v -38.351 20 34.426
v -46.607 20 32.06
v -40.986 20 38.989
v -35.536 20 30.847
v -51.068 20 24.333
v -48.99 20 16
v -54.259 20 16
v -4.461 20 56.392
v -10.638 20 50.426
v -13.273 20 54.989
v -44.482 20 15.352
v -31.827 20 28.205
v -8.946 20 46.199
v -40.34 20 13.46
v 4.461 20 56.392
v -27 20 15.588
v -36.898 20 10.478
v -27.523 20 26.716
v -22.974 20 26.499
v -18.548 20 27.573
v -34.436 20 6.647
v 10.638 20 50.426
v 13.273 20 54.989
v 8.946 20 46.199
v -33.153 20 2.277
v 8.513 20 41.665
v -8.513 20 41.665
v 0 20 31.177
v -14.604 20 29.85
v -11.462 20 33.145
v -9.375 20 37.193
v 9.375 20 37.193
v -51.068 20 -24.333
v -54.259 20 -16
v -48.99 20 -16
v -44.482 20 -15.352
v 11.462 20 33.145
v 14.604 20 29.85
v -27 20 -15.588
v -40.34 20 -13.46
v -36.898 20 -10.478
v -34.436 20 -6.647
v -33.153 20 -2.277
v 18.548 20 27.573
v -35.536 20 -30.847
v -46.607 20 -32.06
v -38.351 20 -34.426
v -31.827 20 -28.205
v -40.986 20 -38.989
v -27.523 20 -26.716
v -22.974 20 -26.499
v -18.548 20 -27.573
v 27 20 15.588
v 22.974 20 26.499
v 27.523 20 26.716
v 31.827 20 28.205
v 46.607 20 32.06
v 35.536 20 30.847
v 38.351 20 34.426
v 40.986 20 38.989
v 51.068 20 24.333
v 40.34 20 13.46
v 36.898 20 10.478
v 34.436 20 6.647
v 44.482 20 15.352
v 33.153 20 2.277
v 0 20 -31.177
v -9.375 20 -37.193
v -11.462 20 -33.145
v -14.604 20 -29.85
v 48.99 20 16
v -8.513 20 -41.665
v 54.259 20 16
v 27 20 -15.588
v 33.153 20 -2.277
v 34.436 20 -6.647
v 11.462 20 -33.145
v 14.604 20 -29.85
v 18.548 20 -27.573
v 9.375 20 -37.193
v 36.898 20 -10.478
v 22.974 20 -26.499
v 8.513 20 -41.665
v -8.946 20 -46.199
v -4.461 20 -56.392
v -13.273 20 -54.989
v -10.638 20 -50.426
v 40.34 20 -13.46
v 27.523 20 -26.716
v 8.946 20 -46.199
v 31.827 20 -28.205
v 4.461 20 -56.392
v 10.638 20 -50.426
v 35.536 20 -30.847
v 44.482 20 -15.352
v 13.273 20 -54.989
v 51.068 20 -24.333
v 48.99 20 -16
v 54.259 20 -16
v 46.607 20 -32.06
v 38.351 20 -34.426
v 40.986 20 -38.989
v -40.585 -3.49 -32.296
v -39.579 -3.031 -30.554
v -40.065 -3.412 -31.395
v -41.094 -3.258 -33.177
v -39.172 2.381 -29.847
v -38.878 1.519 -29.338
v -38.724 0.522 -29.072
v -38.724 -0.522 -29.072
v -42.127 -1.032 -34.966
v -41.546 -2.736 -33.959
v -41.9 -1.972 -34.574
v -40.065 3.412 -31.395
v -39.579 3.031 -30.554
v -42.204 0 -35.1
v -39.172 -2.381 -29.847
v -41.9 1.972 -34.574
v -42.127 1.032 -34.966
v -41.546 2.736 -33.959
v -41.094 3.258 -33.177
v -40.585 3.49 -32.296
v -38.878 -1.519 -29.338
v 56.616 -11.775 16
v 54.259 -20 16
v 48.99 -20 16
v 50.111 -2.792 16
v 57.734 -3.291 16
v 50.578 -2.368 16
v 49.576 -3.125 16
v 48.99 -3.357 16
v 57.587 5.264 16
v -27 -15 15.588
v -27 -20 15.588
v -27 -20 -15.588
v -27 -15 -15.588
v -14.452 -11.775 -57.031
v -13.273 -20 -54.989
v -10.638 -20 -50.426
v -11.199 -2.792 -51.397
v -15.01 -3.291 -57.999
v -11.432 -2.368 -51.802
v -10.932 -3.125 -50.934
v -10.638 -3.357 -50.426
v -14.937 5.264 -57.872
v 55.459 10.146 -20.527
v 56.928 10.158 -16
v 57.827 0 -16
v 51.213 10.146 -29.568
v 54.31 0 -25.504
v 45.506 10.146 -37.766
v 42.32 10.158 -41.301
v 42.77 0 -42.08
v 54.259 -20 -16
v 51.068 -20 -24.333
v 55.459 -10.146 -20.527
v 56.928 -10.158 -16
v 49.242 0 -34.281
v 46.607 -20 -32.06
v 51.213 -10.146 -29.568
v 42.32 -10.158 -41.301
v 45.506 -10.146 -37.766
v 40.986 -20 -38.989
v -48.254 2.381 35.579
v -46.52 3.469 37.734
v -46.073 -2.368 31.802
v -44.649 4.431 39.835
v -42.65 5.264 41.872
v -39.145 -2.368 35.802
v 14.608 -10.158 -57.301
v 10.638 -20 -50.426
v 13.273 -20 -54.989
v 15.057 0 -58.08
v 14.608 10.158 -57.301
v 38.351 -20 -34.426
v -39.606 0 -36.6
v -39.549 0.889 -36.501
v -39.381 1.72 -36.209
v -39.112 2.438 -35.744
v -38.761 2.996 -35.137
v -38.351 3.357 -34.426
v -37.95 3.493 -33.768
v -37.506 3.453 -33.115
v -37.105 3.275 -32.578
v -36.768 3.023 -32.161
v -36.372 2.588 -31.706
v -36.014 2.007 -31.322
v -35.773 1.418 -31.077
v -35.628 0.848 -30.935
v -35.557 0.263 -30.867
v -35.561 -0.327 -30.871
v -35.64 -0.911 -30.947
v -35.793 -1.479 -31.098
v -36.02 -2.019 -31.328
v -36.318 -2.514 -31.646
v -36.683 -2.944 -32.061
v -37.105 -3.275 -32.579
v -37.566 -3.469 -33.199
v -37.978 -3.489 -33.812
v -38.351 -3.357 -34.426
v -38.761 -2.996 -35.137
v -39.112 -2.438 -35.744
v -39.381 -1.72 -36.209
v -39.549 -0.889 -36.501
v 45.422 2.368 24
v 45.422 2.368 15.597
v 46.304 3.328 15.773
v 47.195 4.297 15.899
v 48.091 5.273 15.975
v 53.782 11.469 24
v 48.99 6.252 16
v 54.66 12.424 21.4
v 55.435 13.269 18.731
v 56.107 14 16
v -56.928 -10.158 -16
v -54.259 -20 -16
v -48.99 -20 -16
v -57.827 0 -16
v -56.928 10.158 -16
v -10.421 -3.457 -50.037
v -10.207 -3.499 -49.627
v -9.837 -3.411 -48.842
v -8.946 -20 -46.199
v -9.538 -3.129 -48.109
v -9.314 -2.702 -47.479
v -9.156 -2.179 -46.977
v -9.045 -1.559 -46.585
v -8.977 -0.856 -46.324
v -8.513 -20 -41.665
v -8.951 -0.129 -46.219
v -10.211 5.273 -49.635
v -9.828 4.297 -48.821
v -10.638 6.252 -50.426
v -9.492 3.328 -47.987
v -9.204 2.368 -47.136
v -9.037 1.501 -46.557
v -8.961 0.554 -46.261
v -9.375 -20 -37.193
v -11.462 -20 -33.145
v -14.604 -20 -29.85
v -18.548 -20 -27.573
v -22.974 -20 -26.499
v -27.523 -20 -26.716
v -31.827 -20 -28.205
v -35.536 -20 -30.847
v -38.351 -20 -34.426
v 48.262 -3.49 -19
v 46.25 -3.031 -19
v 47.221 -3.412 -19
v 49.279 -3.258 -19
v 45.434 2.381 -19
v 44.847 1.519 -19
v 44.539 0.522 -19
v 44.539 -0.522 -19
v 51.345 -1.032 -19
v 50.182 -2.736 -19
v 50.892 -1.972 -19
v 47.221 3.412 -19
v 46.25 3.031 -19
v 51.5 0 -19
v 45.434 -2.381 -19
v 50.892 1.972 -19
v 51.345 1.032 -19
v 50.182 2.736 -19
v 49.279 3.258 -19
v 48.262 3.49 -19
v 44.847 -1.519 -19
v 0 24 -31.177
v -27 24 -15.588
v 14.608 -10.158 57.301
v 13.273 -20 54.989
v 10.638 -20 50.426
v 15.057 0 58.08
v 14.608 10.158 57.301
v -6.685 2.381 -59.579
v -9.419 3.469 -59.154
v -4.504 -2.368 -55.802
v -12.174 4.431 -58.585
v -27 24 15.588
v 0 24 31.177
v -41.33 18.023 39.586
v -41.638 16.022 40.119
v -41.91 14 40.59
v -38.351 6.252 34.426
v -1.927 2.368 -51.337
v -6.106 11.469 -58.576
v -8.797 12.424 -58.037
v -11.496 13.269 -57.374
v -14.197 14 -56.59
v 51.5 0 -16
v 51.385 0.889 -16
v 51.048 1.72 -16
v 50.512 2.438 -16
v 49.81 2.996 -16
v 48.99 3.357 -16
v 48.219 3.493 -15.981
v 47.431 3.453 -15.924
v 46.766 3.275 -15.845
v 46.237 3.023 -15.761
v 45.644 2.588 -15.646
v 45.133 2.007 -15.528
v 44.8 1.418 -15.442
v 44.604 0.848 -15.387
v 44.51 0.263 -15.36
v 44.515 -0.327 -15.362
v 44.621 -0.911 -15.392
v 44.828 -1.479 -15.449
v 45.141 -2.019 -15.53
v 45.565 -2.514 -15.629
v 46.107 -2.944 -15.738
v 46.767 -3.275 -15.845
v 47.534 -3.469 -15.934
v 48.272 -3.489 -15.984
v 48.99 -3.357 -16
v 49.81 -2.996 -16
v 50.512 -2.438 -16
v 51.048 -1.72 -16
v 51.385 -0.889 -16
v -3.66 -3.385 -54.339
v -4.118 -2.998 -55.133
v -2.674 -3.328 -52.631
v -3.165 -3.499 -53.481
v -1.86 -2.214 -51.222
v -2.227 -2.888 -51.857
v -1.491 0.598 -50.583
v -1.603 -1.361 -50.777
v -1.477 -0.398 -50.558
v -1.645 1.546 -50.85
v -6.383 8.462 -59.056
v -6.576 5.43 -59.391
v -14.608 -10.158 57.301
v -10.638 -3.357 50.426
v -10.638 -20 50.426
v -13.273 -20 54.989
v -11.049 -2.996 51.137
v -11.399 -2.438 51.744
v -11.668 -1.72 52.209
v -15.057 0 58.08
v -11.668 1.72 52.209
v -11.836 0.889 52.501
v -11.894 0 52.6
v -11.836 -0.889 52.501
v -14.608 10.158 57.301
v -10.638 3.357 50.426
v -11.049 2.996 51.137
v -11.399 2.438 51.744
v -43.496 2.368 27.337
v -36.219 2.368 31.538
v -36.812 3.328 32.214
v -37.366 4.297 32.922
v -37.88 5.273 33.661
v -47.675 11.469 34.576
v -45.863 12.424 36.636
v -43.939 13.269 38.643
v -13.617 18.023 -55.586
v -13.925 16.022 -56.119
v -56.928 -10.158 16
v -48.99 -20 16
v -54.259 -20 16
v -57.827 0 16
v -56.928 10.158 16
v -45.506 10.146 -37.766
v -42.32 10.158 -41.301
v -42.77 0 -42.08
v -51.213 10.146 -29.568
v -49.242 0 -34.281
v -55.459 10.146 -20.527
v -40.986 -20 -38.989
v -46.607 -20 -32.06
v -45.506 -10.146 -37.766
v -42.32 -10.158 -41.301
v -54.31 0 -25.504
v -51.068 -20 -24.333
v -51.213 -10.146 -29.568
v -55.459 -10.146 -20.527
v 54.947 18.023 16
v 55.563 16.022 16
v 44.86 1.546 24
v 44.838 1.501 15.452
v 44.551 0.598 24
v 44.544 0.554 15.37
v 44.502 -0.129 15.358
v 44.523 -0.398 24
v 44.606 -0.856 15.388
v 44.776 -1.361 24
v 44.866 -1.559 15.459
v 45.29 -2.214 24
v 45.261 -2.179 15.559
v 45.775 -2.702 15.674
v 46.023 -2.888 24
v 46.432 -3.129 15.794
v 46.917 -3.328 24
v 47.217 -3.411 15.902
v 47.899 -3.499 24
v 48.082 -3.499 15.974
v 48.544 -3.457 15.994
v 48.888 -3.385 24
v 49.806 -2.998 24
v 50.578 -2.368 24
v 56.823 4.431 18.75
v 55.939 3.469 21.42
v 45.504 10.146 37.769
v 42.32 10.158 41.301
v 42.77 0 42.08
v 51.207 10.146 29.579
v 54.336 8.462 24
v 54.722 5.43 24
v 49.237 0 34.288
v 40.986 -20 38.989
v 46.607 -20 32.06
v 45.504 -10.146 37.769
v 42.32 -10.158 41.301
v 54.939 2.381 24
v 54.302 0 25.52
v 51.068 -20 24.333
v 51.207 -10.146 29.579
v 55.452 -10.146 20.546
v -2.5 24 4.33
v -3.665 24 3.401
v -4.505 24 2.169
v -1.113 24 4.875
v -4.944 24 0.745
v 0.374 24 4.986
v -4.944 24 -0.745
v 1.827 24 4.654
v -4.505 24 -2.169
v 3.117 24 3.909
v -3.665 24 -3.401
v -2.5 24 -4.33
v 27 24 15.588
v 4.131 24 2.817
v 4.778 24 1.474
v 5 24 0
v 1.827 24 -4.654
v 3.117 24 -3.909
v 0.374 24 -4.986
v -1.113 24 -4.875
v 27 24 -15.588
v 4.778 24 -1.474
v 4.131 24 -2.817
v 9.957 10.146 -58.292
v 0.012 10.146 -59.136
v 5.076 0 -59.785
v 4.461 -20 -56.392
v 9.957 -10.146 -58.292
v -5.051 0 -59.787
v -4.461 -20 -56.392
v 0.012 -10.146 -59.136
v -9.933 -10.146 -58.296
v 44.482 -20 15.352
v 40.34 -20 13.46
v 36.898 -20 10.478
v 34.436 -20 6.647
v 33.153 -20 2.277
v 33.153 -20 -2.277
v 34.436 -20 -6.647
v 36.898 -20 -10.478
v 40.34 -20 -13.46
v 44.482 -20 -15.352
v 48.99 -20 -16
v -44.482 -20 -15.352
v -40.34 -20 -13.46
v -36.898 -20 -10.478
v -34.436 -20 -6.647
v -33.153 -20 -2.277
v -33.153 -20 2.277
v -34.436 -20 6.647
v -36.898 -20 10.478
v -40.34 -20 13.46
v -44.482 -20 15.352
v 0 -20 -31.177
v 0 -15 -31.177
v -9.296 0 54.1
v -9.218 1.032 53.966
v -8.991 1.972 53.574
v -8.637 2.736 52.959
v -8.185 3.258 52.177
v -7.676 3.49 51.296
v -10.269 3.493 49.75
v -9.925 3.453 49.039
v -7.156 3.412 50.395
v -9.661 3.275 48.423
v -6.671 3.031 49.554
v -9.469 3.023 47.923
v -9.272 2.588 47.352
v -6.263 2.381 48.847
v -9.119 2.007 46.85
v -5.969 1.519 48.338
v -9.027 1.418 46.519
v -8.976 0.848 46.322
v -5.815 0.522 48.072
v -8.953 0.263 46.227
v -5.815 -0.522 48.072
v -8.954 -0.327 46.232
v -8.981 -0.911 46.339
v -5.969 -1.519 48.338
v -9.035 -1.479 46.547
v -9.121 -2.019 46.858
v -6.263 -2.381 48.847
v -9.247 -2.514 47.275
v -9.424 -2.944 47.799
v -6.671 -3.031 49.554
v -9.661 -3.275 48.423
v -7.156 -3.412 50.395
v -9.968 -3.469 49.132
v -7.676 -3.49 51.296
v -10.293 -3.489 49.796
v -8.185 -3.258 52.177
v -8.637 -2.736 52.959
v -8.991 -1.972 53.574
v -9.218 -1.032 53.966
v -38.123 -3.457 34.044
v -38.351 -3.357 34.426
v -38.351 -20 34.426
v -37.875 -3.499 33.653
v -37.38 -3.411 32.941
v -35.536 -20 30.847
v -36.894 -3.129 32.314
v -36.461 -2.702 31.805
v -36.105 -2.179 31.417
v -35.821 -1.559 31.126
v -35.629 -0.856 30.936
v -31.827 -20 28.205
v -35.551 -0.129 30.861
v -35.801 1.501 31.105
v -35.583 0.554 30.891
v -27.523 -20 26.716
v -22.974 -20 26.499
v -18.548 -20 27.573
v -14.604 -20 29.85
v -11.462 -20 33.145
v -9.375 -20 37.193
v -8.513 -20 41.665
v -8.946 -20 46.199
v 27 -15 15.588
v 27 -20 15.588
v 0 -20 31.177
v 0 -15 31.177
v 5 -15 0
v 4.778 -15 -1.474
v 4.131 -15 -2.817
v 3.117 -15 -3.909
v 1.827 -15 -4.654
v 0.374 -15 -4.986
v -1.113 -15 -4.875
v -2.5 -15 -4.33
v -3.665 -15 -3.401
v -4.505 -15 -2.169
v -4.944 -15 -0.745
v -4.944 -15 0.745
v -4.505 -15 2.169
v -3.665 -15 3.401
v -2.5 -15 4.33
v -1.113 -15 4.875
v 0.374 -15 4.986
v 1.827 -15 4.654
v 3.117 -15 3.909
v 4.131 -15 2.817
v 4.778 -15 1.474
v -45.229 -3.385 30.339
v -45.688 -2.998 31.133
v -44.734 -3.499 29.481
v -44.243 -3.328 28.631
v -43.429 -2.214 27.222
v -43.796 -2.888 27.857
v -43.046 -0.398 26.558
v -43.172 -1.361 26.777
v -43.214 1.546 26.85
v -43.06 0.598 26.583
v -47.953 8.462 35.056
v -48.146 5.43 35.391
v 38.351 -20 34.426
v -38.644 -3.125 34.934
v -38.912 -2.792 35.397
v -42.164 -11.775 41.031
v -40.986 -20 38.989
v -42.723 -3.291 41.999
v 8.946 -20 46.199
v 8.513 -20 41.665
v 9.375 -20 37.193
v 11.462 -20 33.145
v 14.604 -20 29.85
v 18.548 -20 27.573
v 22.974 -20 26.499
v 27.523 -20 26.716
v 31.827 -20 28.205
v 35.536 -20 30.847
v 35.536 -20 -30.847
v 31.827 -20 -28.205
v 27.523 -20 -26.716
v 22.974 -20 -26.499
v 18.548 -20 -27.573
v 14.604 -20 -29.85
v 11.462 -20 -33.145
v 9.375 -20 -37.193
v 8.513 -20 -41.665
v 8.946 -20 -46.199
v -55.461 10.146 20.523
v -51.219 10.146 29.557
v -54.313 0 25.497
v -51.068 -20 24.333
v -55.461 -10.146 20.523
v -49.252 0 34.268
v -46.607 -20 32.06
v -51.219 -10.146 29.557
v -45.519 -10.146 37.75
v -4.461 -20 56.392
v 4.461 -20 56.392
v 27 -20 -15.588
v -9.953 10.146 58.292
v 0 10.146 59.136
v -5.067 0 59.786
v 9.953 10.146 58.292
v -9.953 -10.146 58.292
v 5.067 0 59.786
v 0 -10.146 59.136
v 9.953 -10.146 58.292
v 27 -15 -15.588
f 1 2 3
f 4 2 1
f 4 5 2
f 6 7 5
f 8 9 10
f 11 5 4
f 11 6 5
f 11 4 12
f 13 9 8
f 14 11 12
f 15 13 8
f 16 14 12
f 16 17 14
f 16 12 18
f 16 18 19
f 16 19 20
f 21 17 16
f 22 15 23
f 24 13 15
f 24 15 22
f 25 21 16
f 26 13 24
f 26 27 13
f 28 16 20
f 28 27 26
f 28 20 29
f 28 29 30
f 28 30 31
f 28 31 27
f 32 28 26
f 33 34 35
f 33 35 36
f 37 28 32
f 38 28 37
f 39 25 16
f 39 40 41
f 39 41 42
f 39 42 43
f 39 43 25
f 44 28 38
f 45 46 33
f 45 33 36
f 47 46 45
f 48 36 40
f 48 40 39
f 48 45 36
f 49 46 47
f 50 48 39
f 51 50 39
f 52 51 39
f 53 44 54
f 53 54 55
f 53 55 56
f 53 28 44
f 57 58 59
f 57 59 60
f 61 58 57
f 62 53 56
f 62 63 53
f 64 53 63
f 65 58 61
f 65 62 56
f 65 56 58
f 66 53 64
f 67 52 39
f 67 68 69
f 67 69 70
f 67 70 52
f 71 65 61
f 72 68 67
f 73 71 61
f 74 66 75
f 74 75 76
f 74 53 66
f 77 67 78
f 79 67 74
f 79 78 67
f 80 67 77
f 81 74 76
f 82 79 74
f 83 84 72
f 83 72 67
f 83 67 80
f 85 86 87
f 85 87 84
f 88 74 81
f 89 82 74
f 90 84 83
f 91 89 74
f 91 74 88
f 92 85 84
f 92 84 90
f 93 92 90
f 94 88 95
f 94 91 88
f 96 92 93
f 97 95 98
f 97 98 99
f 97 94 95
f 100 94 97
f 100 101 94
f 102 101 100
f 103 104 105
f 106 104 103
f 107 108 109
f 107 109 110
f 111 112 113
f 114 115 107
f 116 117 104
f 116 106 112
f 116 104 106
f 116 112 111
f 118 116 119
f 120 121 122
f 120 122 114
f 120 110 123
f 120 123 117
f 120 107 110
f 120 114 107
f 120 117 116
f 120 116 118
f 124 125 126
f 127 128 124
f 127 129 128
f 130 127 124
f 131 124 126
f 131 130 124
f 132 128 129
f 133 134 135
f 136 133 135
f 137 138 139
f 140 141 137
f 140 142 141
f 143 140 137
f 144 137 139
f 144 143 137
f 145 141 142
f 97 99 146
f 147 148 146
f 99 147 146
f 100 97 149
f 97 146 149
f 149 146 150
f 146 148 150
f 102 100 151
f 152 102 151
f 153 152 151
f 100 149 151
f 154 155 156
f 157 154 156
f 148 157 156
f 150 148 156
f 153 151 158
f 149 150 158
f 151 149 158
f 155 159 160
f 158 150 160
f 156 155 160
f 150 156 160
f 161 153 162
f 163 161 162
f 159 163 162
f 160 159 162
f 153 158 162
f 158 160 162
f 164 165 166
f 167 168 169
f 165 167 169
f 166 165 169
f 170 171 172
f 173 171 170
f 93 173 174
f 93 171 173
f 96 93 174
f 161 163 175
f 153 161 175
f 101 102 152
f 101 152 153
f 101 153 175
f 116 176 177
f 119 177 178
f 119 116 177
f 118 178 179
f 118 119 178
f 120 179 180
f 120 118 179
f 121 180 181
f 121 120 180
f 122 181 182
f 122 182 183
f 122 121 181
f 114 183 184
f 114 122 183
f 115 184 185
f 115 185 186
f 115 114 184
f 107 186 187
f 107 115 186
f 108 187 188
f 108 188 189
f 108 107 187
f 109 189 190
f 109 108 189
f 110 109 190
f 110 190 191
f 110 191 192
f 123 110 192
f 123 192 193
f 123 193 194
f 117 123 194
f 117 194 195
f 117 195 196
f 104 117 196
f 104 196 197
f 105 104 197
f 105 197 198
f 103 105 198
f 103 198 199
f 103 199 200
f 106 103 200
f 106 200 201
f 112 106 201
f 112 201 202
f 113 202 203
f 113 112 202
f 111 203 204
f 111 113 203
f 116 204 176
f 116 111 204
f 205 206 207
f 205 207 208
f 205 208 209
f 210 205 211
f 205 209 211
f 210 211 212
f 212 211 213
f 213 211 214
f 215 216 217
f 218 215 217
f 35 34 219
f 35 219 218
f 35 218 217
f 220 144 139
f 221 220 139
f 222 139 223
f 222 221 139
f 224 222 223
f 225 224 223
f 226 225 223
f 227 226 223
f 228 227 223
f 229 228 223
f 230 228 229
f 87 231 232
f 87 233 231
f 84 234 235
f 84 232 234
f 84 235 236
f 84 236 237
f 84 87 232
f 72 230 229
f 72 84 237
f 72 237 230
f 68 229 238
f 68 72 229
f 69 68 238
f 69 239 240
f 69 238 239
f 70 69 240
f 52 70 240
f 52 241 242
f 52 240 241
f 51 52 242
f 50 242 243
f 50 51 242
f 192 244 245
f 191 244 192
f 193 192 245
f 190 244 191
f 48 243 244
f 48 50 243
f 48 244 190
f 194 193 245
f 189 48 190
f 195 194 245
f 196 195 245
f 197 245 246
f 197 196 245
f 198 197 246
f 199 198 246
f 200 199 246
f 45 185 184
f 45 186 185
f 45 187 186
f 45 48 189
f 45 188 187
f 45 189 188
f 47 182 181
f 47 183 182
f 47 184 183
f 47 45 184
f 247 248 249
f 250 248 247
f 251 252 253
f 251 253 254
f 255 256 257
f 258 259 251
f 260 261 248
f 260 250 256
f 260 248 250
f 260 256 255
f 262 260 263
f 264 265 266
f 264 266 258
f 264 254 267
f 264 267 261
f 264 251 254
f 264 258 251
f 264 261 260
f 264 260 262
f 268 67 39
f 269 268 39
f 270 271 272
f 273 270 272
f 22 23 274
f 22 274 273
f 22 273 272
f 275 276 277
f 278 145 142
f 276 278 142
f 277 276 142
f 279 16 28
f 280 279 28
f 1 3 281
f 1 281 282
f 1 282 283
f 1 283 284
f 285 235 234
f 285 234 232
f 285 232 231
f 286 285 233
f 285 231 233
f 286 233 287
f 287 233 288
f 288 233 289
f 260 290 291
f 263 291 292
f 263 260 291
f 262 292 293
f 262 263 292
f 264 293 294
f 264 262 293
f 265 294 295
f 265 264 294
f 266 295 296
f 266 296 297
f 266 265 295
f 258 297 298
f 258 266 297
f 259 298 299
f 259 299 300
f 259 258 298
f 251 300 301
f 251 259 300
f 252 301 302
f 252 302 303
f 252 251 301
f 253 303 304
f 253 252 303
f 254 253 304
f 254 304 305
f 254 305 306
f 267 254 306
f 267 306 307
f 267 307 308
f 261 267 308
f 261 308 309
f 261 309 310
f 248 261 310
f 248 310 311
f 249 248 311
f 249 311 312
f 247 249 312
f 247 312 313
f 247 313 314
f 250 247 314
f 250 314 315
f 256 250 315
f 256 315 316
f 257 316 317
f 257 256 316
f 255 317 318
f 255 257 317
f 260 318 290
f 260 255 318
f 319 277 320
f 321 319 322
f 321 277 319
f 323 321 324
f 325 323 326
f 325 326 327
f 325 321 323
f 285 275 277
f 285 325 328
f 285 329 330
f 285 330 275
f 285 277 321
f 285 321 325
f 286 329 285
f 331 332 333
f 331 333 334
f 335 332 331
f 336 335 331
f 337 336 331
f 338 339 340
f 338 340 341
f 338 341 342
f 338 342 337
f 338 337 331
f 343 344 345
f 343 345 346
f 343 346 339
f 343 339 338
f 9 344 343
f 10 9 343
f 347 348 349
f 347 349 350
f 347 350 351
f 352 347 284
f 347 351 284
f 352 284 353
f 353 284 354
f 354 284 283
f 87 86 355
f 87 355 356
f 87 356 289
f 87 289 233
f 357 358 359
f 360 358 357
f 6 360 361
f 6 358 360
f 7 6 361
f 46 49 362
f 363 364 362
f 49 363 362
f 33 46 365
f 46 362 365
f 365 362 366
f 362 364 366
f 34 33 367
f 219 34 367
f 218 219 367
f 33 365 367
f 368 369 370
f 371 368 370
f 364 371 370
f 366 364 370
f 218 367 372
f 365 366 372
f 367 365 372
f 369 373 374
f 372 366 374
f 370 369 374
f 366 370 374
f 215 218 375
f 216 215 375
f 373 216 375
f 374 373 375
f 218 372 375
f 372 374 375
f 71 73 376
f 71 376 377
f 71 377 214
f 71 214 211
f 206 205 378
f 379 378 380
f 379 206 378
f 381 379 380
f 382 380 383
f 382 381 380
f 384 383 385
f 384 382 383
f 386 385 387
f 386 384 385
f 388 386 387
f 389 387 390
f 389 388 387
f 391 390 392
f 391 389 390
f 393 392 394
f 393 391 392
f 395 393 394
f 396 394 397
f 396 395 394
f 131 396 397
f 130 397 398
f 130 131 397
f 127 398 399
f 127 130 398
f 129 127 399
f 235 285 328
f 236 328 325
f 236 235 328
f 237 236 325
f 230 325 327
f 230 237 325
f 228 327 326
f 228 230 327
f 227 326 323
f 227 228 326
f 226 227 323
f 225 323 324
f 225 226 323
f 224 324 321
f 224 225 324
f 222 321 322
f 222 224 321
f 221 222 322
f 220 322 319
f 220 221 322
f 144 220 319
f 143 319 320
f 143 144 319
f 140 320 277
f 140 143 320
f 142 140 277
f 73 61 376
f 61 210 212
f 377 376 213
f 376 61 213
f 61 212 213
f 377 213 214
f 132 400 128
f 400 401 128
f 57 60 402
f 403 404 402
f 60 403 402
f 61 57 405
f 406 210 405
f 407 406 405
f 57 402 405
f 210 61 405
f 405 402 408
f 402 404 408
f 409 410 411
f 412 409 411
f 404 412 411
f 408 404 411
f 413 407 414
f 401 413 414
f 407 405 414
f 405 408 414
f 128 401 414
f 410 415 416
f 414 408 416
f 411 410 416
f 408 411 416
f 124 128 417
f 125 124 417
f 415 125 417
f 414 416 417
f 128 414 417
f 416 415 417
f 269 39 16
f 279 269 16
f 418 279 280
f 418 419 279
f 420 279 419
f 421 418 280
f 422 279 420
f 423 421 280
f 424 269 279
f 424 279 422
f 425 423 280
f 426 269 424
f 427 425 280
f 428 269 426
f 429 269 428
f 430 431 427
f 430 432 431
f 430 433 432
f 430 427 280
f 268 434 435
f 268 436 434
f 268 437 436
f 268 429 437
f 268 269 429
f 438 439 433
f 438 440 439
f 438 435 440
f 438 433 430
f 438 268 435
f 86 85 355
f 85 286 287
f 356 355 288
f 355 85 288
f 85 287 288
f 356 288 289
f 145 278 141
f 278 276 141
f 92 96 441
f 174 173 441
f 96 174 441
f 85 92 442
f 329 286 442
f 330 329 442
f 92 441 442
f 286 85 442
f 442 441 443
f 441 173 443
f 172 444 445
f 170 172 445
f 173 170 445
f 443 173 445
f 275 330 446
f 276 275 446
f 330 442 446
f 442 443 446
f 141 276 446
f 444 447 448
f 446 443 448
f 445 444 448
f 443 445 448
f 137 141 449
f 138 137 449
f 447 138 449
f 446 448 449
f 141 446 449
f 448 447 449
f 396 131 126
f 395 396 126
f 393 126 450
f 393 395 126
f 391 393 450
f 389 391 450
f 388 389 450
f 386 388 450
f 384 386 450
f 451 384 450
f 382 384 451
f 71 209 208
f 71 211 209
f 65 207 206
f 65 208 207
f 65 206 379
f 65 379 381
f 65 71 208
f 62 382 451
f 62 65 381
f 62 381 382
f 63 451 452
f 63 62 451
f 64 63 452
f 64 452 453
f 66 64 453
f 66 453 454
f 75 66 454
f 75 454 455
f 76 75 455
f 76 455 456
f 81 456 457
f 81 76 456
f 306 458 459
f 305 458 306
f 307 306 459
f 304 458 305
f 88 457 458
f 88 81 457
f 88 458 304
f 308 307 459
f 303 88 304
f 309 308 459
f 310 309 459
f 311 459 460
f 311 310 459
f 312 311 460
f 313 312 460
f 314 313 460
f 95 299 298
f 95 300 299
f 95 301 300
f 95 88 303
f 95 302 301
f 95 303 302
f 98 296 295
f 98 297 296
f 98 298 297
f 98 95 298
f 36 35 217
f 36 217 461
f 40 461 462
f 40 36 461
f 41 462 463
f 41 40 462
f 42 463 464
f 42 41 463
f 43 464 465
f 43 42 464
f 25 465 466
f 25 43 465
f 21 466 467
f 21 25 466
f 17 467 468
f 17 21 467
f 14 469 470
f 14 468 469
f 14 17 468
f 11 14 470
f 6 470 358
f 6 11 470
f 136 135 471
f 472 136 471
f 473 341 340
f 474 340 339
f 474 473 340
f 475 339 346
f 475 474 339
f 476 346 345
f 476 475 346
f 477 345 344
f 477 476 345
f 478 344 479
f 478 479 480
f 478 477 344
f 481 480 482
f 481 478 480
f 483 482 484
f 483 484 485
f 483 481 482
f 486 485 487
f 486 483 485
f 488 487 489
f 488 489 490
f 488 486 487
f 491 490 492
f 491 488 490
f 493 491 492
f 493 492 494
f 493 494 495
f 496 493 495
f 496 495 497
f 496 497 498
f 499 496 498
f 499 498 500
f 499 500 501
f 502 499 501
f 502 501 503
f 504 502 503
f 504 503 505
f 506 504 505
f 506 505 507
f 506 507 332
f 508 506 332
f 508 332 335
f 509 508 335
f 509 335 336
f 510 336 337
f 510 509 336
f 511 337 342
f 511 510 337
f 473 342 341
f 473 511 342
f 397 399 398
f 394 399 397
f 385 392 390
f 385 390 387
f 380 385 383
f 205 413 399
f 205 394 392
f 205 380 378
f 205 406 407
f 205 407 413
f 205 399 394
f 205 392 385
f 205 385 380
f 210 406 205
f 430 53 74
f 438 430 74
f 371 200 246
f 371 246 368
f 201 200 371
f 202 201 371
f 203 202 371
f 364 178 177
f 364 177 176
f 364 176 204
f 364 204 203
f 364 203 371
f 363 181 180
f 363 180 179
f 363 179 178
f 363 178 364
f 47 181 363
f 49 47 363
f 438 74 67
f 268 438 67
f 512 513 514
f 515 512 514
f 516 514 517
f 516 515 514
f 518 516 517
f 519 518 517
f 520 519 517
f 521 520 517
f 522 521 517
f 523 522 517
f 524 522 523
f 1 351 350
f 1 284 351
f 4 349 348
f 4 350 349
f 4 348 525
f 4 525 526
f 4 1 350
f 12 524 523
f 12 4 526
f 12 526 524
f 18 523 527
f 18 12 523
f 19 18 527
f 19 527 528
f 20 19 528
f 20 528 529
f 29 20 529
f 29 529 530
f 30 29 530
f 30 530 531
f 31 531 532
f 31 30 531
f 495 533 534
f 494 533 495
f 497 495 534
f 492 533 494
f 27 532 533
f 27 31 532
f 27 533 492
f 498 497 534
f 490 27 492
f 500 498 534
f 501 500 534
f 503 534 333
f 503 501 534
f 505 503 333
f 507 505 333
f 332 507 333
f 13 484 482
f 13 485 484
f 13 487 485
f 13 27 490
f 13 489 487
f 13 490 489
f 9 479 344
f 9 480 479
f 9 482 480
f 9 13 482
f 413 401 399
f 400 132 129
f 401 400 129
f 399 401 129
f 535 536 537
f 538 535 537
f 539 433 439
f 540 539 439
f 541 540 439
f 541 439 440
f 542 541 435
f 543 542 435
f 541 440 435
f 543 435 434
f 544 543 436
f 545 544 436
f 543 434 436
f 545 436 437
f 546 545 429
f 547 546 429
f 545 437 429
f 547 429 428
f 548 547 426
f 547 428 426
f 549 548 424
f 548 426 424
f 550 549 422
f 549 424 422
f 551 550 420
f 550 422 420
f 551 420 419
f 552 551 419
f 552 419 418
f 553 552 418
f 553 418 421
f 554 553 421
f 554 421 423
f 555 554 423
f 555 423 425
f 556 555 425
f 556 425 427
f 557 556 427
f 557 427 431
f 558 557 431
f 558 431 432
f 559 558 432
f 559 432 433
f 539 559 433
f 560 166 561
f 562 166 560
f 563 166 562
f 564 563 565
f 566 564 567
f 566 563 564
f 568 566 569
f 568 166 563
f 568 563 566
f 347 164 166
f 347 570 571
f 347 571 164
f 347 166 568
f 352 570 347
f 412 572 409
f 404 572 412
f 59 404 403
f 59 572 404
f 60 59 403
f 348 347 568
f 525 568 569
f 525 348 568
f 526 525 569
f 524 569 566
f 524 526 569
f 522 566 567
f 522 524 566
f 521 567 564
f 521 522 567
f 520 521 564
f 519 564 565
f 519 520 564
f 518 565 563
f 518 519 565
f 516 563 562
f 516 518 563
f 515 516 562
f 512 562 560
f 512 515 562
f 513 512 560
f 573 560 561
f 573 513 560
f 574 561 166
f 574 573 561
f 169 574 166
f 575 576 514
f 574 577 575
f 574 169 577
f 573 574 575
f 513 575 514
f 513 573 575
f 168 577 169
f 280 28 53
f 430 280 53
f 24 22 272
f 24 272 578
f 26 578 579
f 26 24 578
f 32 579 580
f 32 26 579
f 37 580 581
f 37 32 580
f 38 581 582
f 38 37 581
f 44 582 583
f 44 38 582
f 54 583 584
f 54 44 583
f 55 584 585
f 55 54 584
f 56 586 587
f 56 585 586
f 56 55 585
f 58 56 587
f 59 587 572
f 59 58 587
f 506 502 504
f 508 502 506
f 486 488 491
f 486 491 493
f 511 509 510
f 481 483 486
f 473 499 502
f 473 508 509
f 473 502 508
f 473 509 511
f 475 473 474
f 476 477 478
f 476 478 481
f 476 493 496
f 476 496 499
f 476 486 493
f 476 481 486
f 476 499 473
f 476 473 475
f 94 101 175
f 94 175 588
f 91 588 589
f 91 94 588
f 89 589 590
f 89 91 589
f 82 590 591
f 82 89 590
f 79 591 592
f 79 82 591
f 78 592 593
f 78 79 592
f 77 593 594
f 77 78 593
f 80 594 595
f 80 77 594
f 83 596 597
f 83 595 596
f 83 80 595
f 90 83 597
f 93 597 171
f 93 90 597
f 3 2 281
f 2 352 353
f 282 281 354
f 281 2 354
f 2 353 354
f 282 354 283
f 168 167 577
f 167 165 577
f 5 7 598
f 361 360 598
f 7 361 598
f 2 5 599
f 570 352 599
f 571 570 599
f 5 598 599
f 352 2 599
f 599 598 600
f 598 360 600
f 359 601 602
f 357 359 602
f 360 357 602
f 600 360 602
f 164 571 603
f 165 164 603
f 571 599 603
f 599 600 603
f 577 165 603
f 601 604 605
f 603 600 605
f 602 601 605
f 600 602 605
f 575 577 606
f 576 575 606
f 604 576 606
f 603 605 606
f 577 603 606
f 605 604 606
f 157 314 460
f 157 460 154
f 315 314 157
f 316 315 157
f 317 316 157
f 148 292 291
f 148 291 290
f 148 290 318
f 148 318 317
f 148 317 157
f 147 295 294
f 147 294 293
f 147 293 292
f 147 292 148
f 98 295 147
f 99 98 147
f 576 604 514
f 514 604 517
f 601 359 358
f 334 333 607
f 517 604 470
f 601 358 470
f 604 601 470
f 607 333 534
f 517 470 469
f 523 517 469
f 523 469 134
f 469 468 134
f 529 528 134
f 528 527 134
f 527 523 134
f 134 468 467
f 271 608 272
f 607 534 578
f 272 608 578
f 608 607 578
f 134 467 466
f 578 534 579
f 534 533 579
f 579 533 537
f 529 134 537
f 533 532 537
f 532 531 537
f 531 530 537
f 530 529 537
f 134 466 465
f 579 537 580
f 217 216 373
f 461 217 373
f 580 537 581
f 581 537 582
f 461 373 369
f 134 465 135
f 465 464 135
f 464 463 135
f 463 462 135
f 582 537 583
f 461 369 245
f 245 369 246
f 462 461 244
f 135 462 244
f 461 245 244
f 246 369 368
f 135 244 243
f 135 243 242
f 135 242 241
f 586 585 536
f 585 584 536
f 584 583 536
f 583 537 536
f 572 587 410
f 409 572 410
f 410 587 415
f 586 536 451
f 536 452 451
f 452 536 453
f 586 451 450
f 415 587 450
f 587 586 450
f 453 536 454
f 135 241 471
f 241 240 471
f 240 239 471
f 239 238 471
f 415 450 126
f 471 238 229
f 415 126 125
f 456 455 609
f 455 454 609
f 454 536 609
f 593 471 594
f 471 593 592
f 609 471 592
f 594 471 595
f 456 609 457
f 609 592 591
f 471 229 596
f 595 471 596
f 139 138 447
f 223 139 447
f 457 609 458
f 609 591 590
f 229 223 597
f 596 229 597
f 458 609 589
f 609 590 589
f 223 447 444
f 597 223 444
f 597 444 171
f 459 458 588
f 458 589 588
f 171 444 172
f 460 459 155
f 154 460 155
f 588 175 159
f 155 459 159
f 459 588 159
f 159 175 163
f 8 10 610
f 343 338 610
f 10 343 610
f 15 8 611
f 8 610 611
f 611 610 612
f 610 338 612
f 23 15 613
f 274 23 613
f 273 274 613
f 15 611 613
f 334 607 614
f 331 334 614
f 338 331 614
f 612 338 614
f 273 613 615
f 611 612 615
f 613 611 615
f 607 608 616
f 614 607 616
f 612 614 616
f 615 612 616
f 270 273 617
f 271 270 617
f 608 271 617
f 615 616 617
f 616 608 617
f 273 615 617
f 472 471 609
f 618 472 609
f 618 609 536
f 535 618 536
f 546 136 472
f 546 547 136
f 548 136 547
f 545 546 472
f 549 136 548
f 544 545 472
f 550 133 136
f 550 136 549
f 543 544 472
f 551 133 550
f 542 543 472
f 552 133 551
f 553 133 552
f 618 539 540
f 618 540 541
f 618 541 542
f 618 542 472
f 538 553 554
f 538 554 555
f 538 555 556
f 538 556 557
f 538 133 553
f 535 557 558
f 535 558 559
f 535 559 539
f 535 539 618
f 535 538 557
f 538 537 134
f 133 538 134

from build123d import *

# Parameters (mm, degrees)
SKETCH2_W           = 136.932578545
SKETCH2_H           = 134.741657288
CUT_EXTRUDE1_DEPTH  = 41
SKETCH3_W           = 157.433341732
SKETCH3_H           = 136.306601043
CUT_EXTRUDE2_DEPTH  = 41
CUT_EXTRUDE3_DEPTH  = 41
CUT_EXTRUDE4_START  = -3
SKETCH8_R           = 3.5
CUT_EXTRUDE4_DEPTH  = 43
CUT_EXTRUDE5_DEPTH  = 24
CIRPATTERN1_COUNT   = 6
CIRPATTERN2_COUNT   = 3
BOSS_EXTRUDE1_DEPTH = 4
CUT_EXTRUDE6_DEPTH  = 5
SKETCH12_R          = 5
CUT_EXTRUDE7_DEPTH  = 45.0000001


with BuildPart() as part:
    # Sketch1 → Revolve1 (revolve)
    with BuildSketch(Plane.XY):
        with BuildLine():
            Line((0, 0), (0, 60))
            ThreePointArc((0, 60), (-60, 0), (0, -60))
            Line((0, -60), (0, 0))
        make_face()
    revolve(axis=Axis((0, 0, 0), (0, 1, 0)))

    # Sketch2 → Cut-Extrude1 (cut, through all)
    with BuildSketch(Plane(origin=(0, 20, 0), x_dir=(1, 0, 0), z_dir=(0, 1, 0))):
        with Locations((2.269168444, -1.72143813)):
            Rectangle(SKETCH2_W, SKETCH2_H)
    extrude(amount=CUT_EXTRUDE1_DEPTH, mode=Mode.SUBTRACT)

    # Sketch3 → Cut-Extrude2 (cut, through all)
    with BuildSketch(Plane(origin=(0, -20, 0), x_dir=(1, 0, 0), z_dir=(0, 1, 0))):
        with Locations((3.912359387, -2.503910008)):
            Rectangle(SKETCH3_W, SKETCH3_H)
    extrude(amount=-CUT_EXTRUDE2_DEPTH, mode=Mode.SUBTRACT)

    # Sketch7 → Cut-Extrude3 (cut, through all)
    with BuildSketch(Plane(origin=(0, 20, 0), x_dir=(1, 0, 0), z_dir=(0, 1, 0))):
        with BuildLine():
            Line((48.989794856, 16), (63.030663811, 16))
            Line((63.030663811, 16), (63.030663811, -16))
            Line((63.030663811, -16), (48.989794856, -16))
            ThreePointArc((48.989794856, -16), (32.989794856, 0), (48.989794856, 16))
        make_face()
    cut_extrude3 = extrude(amount=-CUT_EXTRUDE3_DEPTH, mode=Mode.SUBTRACT)

    # Sketch8 → Cut-Extrude4 (cut)
    with BuildSketch(Plane.XY.offset(-16).offset(CUT_EXTRUDE4_START)):
        with Locations((48, 0)):
            Circle(SKETCH8_R)
    cut_extrude4 = extrude(amount=CUT_EXTRUDE4_DEPTH, mode=Mode.SUBTRACT)

    # Sketch9 → Cut-Extrude5 (cut)
    with BuildSketch(Plane.XY):
        with BuildLine():
            Line((45.422340515, 2.36762995), (57.946221285, 16.002488752))
            Line((57.946221285, 16.002488752), (63.101540255, 11.267228853))
            Line((63.101540255, 11.267228853), (50.577659485, -2.36762995))
            ThreePointArc((50.577659485, -2.36762995), (45.63237005, -2.577659485), (45.422340515, 2.36762995))
        make_face()
    cut_extrude5 = extrude(amount=CUT_EXTRUDE5_DEPTH, mode=Mode.SUBTRACT)

    # CirPattern1: Cut-Extrude3 ×6 about axis
    cirpattern1_axis = Axis((0, 0, 0), (0, 1, 0))
    for i in range(1, CIRPATTERN1_COUNT):
        add(cut_extrude3.rotate(cirpattern1_axis, i * 360 / CIRPATTERN1_COUNT), mode=Mode.SUBTRACT)

    # CirPattern2: Cut-Extrude4, Cut-Extrude5 ×3 about axis
    cirpattern2_axis = Axis((0, 0, 0), (0, 1, 0))
    for i in range(1, CIRPATTERN2_COUNT):
        add(cut_extrude4.rotate(cirpattern2_axis, i * 360 / CIRPATTERN2_COUNT), mode=Mode.SUBTRACT)
        add(cut_extrude5.rotate(cirpattern2_axis, i * 360 / CIRPATTERN2_COUNT), mode=Mode.SUBTRACT)

    # Sketch10 → Boss-Extrude1 (add)
    with BuildSketch(Plane(origin=(0, 20, 0), x_dir=(1, 0, 0), z_dir=(0, 1, 0))):
        Polygon((27, -15.588457268), (27, 15.588457268), (0, 31.176914536), (-27, 15.588457268), (-27, -15.588457268), (0, -31.176914536), align=None)
    extrude(amount=BOSS_EXTRUDE1_DEPTH)

    # Sketch11 → Cut-Extrude6 (cut)
    with BuildSketch(Plane.XZ.offset(20)):
        Polygon((27, -15.588457268), (27, 15.588457268), (0, 31.176914536), (-27, 15.588457268), (-27, -15.588457268), (0, -31.176914536), align=None)
    extrude(amount=-CUT_EXTRUDE6_DEPTH, mode=Mode.SUBTRACT)

    # Sketch12 → Cut-Extrude7 (cut, through all)
    with BuildSketch(Plane(origin=(0, 24, 0), x_dir=(1, 0, 0), z_dir=(0, 1, 0))):
        Circle(SKETCH12_R)
    extrude(amount=-CUT_EXTRUDE7_DEPTH, mode=Mode.SUBTRACT)


solid = part.part
